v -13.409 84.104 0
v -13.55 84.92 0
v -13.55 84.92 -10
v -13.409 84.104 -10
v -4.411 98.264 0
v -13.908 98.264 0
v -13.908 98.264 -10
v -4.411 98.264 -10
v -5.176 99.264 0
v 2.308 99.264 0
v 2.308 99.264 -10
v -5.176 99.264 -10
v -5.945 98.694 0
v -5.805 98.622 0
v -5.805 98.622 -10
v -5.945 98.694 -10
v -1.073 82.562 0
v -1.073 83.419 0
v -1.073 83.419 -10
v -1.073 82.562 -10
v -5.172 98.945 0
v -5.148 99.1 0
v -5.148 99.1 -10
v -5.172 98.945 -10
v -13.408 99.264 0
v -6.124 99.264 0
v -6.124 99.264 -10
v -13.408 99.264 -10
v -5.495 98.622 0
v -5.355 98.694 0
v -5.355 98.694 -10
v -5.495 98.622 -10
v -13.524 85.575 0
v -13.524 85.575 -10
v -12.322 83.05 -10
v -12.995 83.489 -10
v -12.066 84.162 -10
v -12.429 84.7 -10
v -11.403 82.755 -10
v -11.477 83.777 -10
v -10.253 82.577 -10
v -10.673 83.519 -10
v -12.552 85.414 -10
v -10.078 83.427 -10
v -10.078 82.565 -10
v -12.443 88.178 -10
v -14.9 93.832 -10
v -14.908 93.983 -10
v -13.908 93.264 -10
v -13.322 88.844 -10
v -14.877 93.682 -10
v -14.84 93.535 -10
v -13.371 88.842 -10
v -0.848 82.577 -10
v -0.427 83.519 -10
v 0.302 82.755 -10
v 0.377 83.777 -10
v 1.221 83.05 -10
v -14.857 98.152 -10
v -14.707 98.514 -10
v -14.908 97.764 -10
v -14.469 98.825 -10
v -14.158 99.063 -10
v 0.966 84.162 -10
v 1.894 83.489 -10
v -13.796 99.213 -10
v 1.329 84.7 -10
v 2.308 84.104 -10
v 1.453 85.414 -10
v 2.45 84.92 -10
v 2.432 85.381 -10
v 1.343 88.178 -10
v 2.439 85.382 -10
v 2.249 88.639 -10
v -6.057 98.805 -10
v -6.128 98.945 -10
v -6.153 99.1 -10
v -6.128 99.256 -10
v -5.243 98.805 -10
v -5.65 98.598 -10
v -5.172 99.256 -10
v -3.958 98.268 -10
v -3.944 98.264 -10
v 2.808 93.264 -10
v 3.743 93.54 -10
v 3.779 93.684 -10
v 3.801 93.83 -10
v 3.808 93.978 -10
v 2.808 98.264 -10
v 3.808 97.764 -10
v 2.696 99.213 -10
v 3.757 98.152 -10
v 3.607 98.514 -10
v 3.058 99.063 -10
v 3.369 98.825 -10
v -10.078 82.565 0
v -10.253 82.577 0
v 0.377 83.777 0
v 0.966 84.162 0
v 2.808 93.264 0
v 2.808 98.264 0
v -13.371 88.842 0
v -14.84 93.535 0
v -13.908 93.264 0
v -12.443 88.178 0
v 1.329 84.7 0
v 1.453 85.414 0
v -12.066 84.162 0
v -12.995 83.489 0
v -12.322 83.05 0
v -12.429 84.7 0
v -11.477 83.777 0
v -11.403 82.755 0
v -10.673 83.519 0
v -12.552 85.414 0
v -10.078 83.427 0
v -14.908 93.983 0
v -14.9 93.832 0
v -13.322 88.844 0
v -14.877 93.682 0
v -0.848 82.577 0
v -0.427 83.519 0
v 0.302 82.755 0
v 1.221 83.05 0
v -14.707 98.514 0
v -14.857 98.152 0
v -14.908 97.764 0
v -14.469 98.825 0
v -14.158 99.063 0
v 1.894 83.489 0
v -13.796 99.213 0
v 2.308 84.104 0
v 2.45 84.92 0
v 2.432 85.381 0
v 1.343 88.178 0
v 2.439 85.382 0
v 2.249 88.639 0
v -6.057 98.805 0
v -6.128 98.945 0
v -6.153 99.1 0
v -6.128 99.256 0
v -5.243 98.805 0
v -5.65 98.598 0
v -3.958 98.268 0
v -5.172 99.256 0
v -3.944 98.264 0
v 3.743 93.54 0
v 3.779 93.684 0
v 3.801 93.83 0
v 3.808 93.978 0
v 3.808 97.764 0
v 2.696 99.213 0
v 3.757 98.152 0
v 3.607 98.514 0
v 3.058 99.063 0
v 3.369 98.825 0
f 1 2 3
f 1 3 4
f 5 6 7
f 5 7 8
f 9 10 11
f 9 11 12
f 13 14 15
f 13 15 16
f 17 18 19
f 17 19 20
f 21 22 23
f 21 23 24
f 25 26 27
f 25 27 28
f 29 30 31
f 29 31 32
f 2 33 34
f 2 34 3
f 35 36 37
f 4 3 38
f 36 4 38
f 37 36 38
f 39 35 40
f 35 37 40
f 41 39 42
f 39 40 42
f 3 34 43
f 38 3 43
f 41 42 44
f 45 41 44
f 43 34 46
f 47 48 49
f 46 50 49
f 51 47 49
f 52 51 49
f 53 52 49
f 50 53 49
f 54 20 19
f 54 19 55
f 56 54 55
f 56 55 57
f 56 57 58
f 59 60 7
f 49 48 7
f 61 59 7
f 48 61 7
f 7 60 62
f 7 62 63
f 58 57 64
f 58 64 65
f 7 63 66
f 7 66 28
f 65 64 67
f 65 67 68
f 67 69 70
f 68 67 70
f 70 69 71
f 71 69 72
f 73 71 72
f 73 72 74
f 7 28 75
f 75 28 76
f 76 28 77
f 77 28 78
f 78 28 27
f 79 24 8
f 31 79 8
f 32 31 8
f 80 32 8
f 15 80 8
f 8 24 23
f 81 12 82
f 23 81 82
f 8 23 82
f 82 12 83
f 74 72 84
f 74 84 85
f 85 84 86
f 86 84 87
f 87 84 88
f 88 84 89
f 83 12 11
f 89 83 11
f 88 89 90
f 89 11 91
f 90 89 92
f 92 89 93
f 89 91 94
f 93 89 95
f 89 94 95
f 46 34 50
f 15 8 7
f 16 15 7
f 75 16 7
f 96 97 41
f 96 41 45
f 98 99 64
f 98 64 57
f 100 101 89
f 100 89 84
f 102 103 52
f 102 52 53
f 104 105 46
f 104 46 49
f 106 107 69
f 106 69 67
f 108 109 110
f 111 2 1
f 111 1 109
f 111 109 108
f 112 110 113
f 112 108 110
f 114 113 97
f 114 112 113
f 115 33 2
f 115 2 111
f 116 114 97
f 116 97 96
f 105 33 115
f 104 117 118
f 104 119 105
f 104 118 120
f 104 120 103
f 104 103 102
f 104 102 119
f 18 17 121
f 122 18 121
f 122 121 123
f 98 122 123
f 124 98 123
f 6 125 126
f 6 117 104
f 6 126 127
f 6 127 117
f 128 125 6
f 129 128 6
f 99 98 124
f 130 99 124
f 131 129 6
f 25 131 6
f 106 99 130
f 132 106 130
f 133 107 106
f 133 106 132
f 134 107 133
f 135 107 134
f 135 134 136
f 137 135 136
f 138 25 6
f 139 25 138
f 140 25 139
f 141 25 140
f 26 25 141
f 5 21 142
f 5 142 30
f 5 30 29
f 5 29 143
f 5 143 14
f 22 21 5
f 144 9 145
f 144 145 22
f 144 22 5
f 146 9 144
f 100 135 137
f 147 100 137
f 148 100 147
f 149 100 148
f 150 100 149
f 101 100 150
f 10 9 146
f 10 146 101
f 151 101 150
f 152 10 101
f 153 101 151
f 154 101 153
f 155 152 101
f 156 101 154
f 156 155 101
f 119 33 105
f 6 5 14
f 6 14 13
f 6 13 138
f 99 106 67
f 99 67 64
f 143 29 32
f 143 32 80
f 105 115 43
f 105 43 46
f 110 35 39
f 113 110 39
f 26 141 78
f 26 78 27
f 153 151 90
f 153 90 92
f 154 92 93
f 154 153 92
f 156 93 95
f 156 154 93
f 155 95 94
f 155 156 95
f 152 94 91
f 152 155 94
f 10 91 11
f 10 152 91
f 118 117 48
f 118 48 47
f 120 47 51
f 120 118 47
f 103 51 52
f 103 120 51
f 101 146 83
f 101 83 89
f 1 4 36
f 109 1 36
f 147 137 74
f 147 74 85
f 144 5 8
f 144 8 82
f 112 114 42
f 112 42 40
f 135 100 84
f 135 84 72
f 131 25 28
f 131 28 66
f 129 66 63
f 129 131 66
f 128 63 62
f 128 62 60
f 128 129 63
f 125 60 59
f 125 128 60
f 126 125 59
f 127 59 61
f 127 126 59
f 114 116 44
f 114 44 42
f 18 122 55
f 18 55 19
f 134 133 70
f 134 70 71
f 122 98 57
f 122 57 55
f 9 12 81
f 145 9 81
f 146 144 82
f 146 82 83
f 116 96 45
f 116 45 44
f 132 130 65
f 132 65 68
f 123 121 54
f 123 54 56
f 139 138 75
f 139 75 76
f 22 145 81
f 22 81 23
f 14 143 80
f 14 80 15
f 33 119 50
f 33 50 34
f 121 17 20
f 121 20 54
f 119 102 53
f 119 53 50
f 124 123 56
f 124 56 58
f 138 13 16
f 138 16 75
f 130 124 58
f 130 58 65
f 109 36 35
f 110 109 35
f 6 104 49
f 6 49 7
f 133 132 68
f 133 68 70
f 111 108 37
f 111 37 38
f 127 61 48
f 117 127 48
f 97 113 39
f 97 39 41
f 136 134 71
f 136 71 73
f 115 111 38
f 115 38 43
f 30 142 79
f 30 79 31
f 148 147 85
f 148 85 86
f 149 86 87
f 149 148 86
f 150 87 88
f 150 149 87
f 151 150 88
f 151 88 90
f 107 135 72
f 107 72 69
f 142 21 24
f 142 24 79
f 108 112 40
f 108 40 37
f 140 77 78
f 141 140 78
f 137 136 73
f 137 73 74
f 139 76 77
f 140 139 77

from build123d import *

# Parameters (mm, degrees)
BOSS_EXTRUDE1_DEPTH = 10


# Read off the part's stored shape, not the designer's step: Imported1
with BuildPart() as part:
    # Sketch5 → Boss-Extrude1 (new body)
    with BuildSketch(Plane.XY):
        with BuildLine():
            Line((-6.05700016, 98.805000305), (-6.127999783, 98.944999695))
            Line((-6.127999783, 98.944999695), (-6.152999878, 99.099998474))
            Line((-6.152999878, 99.099998474), (-6.127999783, 99.255996704))
            Line((-6.127999783, 99.255996704), (-6.123951545, 99.263979588))
            Line((-6.123951545, 99.263979588), (-13.408000231, 99.263979588))
            ThreePointArc((-13.408000231, 99.263979588), (-14.468660403, 98.82463976), (-14.908000231, 97.763979588))
            Line((-14.908000231, 97.763979588), (-14.908000231, 93.983181661))
            ThreePointArc((-14.908000231, 93.983181661), (-14.890789829, 93.756609361), (-14.839553555, 93.535236262))
            Line((-14.839553555, 93.535236262), (-13.37100029, 88.842002869))
            Line((-13.37100029, 88.842002869), (-13.322039604, 88.843772888))
            Line((-13.322039604, 88.843772888), (-13.524080276, 85.57485199))
            Line((-13.524080276, 85.57485199), (-13.550000191, 84.919998169))
            Line((-13.550000191, 84.919998169), (-13.409000397, 84.103996277))
            Line((-13.409000397, 84.103996277), (-12.994999886, 83.488998413))
            Line((-12.994999886, 83.488998413), (-12.32199955, 83.050003052))
            Line((-12.32199955, 83.050003052), (-11.402999878, 82.754997253))
            Line((-11.402999878, 82.754997253), (-10.253000259, 82.577003479))
            Line((-10.253000259, 82.577003479), (-10.078000069, 82.565231323))
            Line((-10.078000069, 82.565231323), (-10.078000069, 83.426826477))
            Line((-10.078000069, 83.426826477), (-10.673000336, 83.518997192))
            Line((-10.673000336, 83.518997192), (-11.477000237, 83.777000427))
            Line((-11.477000237, 83.777000427), (-12.065999985, 84.162002563))
            Line((-12.065999985, 84.162002563), (-12.428999901, 84.699996948))
            Line((-12.428999901, 84.699996948), (-12.552000046, 85.414001465))
            Line((-12.552000046, 85.414001465), (-12.44299984, 88.178001404))
            Line((-12.44299984, 88.178001404), (-13.908000231, 93.263979588))
            Line((-13.908000231, 93.263979588), (-13.908000231, 98.263979588))
            Line((-13.908000231, 98.263979588), (-4.410530424, 98.263979588))
            Line((-4.410530424, 98.263979588), (-3.957890034, 98.267951965))
            Line((-3.957890034, 98.267951965), (-3.944104194, 98.263979588))
            Line((-3.944104194, 98.263979588), (2.807999849, 98.263979588))
            Line((2.807999849, 98.263979588), (2.807999849, 93.263979588))
            Line((2.807999849, 93.263979588), (1.343000054, 88.178001404))
            Line((1.343000054, 88.178001404), (1.452999949, 85.414001465))
            Line((1.452999949, 85.414001465), (1.328999996, 84.699996948))
            Line((1.328999996, 84.699996948), (0.966000021, 84.162002563))
            Line((0.966000021, 84.162002563), (0.377000004, 83.777000427))
            Line((0.377000004, 83.777000427), (-0.426999986, 83.518997192))
            Line((-0.426999986, 83.518997192), (-1.072999954, 83.418922424))
            Line((-1.072999954, 83.418922424), (-1.072999954, 82.56186676))
            Line((-1.072999954, 82.56186676), (-0.84799999, 82.577003479))
            Line((-0.84799999, 82.577003479), (0.301999986, 82.754997253))
            Line((0.301999986, 82.754997253), (1.220999956, 83.050003052))
            Line((1.220999956, 83.050003052), (1.894000053, 83.488998413))
            Line((1.894000053, 83.488998413), (2.308000088, 84.103996277))
            Line((2.308000088, 84.103996277), (2.450000048, 84.919998169))
            Line((2.450000048, 84.919998169), (2.431600094, 85.381187439))
            Line((2.431600094, 85.381187439), (2.438999891, 85.382003784))
            Line((2.438999891, 85.382003784), (2.248559952, 88.639091492))
            Line((2.248559952, 88.639091492), (3.742796809, 93.540116743))
            ThreePointArc((3.742796809, 93.540116743), (3.791609542, 93.756422636), (3.807999849, 93.977561235))
            Line((3.807999849, 93.977561235), (3.807999849, 97.763979588))
            ThreePointArc((3.807999849, 97.763979588), (3.368660021, 98.82463976), (2.307999849, 99.263979588))
            Line((2.307999849, 99.263979588), (-5.176048197, 99.263979588))
            Line((-5.176048197, 99.263979588), (-5.171999931, 99.255996704))
            Line((-5.171999931, 99.255996704), (-5.147999763, 99.099998474))
            Line((-5.147999763, 99.099998474), (-5.171999931, 98.944999695))
            Line((-5.171999931, 98.944999695), (-5.243000031, 98.805000305))
            Line((-5.243000031, 98.805000305), (-5.355000019, 98.694000244))
            Line((-5.355000019, 98.694000244), (-5.494999886, 98.622001648))
            Line((-5.494999886, 98.622001648), (-5.650000095, 98.597999573))
            Line((-5.650000095, 98.597999573), (-5.804999828, 98.622001648))
            Line((-5.804999828, 98.622001648), (-5.945000172, 98.694000244))
            Line((-5.945000172, 98.694000244), (-6.05700016, 98.805000305))
        make_face()
    extrude(amount=-BOSS_EXTRUDE1_DEPTH)


solid = part.part
